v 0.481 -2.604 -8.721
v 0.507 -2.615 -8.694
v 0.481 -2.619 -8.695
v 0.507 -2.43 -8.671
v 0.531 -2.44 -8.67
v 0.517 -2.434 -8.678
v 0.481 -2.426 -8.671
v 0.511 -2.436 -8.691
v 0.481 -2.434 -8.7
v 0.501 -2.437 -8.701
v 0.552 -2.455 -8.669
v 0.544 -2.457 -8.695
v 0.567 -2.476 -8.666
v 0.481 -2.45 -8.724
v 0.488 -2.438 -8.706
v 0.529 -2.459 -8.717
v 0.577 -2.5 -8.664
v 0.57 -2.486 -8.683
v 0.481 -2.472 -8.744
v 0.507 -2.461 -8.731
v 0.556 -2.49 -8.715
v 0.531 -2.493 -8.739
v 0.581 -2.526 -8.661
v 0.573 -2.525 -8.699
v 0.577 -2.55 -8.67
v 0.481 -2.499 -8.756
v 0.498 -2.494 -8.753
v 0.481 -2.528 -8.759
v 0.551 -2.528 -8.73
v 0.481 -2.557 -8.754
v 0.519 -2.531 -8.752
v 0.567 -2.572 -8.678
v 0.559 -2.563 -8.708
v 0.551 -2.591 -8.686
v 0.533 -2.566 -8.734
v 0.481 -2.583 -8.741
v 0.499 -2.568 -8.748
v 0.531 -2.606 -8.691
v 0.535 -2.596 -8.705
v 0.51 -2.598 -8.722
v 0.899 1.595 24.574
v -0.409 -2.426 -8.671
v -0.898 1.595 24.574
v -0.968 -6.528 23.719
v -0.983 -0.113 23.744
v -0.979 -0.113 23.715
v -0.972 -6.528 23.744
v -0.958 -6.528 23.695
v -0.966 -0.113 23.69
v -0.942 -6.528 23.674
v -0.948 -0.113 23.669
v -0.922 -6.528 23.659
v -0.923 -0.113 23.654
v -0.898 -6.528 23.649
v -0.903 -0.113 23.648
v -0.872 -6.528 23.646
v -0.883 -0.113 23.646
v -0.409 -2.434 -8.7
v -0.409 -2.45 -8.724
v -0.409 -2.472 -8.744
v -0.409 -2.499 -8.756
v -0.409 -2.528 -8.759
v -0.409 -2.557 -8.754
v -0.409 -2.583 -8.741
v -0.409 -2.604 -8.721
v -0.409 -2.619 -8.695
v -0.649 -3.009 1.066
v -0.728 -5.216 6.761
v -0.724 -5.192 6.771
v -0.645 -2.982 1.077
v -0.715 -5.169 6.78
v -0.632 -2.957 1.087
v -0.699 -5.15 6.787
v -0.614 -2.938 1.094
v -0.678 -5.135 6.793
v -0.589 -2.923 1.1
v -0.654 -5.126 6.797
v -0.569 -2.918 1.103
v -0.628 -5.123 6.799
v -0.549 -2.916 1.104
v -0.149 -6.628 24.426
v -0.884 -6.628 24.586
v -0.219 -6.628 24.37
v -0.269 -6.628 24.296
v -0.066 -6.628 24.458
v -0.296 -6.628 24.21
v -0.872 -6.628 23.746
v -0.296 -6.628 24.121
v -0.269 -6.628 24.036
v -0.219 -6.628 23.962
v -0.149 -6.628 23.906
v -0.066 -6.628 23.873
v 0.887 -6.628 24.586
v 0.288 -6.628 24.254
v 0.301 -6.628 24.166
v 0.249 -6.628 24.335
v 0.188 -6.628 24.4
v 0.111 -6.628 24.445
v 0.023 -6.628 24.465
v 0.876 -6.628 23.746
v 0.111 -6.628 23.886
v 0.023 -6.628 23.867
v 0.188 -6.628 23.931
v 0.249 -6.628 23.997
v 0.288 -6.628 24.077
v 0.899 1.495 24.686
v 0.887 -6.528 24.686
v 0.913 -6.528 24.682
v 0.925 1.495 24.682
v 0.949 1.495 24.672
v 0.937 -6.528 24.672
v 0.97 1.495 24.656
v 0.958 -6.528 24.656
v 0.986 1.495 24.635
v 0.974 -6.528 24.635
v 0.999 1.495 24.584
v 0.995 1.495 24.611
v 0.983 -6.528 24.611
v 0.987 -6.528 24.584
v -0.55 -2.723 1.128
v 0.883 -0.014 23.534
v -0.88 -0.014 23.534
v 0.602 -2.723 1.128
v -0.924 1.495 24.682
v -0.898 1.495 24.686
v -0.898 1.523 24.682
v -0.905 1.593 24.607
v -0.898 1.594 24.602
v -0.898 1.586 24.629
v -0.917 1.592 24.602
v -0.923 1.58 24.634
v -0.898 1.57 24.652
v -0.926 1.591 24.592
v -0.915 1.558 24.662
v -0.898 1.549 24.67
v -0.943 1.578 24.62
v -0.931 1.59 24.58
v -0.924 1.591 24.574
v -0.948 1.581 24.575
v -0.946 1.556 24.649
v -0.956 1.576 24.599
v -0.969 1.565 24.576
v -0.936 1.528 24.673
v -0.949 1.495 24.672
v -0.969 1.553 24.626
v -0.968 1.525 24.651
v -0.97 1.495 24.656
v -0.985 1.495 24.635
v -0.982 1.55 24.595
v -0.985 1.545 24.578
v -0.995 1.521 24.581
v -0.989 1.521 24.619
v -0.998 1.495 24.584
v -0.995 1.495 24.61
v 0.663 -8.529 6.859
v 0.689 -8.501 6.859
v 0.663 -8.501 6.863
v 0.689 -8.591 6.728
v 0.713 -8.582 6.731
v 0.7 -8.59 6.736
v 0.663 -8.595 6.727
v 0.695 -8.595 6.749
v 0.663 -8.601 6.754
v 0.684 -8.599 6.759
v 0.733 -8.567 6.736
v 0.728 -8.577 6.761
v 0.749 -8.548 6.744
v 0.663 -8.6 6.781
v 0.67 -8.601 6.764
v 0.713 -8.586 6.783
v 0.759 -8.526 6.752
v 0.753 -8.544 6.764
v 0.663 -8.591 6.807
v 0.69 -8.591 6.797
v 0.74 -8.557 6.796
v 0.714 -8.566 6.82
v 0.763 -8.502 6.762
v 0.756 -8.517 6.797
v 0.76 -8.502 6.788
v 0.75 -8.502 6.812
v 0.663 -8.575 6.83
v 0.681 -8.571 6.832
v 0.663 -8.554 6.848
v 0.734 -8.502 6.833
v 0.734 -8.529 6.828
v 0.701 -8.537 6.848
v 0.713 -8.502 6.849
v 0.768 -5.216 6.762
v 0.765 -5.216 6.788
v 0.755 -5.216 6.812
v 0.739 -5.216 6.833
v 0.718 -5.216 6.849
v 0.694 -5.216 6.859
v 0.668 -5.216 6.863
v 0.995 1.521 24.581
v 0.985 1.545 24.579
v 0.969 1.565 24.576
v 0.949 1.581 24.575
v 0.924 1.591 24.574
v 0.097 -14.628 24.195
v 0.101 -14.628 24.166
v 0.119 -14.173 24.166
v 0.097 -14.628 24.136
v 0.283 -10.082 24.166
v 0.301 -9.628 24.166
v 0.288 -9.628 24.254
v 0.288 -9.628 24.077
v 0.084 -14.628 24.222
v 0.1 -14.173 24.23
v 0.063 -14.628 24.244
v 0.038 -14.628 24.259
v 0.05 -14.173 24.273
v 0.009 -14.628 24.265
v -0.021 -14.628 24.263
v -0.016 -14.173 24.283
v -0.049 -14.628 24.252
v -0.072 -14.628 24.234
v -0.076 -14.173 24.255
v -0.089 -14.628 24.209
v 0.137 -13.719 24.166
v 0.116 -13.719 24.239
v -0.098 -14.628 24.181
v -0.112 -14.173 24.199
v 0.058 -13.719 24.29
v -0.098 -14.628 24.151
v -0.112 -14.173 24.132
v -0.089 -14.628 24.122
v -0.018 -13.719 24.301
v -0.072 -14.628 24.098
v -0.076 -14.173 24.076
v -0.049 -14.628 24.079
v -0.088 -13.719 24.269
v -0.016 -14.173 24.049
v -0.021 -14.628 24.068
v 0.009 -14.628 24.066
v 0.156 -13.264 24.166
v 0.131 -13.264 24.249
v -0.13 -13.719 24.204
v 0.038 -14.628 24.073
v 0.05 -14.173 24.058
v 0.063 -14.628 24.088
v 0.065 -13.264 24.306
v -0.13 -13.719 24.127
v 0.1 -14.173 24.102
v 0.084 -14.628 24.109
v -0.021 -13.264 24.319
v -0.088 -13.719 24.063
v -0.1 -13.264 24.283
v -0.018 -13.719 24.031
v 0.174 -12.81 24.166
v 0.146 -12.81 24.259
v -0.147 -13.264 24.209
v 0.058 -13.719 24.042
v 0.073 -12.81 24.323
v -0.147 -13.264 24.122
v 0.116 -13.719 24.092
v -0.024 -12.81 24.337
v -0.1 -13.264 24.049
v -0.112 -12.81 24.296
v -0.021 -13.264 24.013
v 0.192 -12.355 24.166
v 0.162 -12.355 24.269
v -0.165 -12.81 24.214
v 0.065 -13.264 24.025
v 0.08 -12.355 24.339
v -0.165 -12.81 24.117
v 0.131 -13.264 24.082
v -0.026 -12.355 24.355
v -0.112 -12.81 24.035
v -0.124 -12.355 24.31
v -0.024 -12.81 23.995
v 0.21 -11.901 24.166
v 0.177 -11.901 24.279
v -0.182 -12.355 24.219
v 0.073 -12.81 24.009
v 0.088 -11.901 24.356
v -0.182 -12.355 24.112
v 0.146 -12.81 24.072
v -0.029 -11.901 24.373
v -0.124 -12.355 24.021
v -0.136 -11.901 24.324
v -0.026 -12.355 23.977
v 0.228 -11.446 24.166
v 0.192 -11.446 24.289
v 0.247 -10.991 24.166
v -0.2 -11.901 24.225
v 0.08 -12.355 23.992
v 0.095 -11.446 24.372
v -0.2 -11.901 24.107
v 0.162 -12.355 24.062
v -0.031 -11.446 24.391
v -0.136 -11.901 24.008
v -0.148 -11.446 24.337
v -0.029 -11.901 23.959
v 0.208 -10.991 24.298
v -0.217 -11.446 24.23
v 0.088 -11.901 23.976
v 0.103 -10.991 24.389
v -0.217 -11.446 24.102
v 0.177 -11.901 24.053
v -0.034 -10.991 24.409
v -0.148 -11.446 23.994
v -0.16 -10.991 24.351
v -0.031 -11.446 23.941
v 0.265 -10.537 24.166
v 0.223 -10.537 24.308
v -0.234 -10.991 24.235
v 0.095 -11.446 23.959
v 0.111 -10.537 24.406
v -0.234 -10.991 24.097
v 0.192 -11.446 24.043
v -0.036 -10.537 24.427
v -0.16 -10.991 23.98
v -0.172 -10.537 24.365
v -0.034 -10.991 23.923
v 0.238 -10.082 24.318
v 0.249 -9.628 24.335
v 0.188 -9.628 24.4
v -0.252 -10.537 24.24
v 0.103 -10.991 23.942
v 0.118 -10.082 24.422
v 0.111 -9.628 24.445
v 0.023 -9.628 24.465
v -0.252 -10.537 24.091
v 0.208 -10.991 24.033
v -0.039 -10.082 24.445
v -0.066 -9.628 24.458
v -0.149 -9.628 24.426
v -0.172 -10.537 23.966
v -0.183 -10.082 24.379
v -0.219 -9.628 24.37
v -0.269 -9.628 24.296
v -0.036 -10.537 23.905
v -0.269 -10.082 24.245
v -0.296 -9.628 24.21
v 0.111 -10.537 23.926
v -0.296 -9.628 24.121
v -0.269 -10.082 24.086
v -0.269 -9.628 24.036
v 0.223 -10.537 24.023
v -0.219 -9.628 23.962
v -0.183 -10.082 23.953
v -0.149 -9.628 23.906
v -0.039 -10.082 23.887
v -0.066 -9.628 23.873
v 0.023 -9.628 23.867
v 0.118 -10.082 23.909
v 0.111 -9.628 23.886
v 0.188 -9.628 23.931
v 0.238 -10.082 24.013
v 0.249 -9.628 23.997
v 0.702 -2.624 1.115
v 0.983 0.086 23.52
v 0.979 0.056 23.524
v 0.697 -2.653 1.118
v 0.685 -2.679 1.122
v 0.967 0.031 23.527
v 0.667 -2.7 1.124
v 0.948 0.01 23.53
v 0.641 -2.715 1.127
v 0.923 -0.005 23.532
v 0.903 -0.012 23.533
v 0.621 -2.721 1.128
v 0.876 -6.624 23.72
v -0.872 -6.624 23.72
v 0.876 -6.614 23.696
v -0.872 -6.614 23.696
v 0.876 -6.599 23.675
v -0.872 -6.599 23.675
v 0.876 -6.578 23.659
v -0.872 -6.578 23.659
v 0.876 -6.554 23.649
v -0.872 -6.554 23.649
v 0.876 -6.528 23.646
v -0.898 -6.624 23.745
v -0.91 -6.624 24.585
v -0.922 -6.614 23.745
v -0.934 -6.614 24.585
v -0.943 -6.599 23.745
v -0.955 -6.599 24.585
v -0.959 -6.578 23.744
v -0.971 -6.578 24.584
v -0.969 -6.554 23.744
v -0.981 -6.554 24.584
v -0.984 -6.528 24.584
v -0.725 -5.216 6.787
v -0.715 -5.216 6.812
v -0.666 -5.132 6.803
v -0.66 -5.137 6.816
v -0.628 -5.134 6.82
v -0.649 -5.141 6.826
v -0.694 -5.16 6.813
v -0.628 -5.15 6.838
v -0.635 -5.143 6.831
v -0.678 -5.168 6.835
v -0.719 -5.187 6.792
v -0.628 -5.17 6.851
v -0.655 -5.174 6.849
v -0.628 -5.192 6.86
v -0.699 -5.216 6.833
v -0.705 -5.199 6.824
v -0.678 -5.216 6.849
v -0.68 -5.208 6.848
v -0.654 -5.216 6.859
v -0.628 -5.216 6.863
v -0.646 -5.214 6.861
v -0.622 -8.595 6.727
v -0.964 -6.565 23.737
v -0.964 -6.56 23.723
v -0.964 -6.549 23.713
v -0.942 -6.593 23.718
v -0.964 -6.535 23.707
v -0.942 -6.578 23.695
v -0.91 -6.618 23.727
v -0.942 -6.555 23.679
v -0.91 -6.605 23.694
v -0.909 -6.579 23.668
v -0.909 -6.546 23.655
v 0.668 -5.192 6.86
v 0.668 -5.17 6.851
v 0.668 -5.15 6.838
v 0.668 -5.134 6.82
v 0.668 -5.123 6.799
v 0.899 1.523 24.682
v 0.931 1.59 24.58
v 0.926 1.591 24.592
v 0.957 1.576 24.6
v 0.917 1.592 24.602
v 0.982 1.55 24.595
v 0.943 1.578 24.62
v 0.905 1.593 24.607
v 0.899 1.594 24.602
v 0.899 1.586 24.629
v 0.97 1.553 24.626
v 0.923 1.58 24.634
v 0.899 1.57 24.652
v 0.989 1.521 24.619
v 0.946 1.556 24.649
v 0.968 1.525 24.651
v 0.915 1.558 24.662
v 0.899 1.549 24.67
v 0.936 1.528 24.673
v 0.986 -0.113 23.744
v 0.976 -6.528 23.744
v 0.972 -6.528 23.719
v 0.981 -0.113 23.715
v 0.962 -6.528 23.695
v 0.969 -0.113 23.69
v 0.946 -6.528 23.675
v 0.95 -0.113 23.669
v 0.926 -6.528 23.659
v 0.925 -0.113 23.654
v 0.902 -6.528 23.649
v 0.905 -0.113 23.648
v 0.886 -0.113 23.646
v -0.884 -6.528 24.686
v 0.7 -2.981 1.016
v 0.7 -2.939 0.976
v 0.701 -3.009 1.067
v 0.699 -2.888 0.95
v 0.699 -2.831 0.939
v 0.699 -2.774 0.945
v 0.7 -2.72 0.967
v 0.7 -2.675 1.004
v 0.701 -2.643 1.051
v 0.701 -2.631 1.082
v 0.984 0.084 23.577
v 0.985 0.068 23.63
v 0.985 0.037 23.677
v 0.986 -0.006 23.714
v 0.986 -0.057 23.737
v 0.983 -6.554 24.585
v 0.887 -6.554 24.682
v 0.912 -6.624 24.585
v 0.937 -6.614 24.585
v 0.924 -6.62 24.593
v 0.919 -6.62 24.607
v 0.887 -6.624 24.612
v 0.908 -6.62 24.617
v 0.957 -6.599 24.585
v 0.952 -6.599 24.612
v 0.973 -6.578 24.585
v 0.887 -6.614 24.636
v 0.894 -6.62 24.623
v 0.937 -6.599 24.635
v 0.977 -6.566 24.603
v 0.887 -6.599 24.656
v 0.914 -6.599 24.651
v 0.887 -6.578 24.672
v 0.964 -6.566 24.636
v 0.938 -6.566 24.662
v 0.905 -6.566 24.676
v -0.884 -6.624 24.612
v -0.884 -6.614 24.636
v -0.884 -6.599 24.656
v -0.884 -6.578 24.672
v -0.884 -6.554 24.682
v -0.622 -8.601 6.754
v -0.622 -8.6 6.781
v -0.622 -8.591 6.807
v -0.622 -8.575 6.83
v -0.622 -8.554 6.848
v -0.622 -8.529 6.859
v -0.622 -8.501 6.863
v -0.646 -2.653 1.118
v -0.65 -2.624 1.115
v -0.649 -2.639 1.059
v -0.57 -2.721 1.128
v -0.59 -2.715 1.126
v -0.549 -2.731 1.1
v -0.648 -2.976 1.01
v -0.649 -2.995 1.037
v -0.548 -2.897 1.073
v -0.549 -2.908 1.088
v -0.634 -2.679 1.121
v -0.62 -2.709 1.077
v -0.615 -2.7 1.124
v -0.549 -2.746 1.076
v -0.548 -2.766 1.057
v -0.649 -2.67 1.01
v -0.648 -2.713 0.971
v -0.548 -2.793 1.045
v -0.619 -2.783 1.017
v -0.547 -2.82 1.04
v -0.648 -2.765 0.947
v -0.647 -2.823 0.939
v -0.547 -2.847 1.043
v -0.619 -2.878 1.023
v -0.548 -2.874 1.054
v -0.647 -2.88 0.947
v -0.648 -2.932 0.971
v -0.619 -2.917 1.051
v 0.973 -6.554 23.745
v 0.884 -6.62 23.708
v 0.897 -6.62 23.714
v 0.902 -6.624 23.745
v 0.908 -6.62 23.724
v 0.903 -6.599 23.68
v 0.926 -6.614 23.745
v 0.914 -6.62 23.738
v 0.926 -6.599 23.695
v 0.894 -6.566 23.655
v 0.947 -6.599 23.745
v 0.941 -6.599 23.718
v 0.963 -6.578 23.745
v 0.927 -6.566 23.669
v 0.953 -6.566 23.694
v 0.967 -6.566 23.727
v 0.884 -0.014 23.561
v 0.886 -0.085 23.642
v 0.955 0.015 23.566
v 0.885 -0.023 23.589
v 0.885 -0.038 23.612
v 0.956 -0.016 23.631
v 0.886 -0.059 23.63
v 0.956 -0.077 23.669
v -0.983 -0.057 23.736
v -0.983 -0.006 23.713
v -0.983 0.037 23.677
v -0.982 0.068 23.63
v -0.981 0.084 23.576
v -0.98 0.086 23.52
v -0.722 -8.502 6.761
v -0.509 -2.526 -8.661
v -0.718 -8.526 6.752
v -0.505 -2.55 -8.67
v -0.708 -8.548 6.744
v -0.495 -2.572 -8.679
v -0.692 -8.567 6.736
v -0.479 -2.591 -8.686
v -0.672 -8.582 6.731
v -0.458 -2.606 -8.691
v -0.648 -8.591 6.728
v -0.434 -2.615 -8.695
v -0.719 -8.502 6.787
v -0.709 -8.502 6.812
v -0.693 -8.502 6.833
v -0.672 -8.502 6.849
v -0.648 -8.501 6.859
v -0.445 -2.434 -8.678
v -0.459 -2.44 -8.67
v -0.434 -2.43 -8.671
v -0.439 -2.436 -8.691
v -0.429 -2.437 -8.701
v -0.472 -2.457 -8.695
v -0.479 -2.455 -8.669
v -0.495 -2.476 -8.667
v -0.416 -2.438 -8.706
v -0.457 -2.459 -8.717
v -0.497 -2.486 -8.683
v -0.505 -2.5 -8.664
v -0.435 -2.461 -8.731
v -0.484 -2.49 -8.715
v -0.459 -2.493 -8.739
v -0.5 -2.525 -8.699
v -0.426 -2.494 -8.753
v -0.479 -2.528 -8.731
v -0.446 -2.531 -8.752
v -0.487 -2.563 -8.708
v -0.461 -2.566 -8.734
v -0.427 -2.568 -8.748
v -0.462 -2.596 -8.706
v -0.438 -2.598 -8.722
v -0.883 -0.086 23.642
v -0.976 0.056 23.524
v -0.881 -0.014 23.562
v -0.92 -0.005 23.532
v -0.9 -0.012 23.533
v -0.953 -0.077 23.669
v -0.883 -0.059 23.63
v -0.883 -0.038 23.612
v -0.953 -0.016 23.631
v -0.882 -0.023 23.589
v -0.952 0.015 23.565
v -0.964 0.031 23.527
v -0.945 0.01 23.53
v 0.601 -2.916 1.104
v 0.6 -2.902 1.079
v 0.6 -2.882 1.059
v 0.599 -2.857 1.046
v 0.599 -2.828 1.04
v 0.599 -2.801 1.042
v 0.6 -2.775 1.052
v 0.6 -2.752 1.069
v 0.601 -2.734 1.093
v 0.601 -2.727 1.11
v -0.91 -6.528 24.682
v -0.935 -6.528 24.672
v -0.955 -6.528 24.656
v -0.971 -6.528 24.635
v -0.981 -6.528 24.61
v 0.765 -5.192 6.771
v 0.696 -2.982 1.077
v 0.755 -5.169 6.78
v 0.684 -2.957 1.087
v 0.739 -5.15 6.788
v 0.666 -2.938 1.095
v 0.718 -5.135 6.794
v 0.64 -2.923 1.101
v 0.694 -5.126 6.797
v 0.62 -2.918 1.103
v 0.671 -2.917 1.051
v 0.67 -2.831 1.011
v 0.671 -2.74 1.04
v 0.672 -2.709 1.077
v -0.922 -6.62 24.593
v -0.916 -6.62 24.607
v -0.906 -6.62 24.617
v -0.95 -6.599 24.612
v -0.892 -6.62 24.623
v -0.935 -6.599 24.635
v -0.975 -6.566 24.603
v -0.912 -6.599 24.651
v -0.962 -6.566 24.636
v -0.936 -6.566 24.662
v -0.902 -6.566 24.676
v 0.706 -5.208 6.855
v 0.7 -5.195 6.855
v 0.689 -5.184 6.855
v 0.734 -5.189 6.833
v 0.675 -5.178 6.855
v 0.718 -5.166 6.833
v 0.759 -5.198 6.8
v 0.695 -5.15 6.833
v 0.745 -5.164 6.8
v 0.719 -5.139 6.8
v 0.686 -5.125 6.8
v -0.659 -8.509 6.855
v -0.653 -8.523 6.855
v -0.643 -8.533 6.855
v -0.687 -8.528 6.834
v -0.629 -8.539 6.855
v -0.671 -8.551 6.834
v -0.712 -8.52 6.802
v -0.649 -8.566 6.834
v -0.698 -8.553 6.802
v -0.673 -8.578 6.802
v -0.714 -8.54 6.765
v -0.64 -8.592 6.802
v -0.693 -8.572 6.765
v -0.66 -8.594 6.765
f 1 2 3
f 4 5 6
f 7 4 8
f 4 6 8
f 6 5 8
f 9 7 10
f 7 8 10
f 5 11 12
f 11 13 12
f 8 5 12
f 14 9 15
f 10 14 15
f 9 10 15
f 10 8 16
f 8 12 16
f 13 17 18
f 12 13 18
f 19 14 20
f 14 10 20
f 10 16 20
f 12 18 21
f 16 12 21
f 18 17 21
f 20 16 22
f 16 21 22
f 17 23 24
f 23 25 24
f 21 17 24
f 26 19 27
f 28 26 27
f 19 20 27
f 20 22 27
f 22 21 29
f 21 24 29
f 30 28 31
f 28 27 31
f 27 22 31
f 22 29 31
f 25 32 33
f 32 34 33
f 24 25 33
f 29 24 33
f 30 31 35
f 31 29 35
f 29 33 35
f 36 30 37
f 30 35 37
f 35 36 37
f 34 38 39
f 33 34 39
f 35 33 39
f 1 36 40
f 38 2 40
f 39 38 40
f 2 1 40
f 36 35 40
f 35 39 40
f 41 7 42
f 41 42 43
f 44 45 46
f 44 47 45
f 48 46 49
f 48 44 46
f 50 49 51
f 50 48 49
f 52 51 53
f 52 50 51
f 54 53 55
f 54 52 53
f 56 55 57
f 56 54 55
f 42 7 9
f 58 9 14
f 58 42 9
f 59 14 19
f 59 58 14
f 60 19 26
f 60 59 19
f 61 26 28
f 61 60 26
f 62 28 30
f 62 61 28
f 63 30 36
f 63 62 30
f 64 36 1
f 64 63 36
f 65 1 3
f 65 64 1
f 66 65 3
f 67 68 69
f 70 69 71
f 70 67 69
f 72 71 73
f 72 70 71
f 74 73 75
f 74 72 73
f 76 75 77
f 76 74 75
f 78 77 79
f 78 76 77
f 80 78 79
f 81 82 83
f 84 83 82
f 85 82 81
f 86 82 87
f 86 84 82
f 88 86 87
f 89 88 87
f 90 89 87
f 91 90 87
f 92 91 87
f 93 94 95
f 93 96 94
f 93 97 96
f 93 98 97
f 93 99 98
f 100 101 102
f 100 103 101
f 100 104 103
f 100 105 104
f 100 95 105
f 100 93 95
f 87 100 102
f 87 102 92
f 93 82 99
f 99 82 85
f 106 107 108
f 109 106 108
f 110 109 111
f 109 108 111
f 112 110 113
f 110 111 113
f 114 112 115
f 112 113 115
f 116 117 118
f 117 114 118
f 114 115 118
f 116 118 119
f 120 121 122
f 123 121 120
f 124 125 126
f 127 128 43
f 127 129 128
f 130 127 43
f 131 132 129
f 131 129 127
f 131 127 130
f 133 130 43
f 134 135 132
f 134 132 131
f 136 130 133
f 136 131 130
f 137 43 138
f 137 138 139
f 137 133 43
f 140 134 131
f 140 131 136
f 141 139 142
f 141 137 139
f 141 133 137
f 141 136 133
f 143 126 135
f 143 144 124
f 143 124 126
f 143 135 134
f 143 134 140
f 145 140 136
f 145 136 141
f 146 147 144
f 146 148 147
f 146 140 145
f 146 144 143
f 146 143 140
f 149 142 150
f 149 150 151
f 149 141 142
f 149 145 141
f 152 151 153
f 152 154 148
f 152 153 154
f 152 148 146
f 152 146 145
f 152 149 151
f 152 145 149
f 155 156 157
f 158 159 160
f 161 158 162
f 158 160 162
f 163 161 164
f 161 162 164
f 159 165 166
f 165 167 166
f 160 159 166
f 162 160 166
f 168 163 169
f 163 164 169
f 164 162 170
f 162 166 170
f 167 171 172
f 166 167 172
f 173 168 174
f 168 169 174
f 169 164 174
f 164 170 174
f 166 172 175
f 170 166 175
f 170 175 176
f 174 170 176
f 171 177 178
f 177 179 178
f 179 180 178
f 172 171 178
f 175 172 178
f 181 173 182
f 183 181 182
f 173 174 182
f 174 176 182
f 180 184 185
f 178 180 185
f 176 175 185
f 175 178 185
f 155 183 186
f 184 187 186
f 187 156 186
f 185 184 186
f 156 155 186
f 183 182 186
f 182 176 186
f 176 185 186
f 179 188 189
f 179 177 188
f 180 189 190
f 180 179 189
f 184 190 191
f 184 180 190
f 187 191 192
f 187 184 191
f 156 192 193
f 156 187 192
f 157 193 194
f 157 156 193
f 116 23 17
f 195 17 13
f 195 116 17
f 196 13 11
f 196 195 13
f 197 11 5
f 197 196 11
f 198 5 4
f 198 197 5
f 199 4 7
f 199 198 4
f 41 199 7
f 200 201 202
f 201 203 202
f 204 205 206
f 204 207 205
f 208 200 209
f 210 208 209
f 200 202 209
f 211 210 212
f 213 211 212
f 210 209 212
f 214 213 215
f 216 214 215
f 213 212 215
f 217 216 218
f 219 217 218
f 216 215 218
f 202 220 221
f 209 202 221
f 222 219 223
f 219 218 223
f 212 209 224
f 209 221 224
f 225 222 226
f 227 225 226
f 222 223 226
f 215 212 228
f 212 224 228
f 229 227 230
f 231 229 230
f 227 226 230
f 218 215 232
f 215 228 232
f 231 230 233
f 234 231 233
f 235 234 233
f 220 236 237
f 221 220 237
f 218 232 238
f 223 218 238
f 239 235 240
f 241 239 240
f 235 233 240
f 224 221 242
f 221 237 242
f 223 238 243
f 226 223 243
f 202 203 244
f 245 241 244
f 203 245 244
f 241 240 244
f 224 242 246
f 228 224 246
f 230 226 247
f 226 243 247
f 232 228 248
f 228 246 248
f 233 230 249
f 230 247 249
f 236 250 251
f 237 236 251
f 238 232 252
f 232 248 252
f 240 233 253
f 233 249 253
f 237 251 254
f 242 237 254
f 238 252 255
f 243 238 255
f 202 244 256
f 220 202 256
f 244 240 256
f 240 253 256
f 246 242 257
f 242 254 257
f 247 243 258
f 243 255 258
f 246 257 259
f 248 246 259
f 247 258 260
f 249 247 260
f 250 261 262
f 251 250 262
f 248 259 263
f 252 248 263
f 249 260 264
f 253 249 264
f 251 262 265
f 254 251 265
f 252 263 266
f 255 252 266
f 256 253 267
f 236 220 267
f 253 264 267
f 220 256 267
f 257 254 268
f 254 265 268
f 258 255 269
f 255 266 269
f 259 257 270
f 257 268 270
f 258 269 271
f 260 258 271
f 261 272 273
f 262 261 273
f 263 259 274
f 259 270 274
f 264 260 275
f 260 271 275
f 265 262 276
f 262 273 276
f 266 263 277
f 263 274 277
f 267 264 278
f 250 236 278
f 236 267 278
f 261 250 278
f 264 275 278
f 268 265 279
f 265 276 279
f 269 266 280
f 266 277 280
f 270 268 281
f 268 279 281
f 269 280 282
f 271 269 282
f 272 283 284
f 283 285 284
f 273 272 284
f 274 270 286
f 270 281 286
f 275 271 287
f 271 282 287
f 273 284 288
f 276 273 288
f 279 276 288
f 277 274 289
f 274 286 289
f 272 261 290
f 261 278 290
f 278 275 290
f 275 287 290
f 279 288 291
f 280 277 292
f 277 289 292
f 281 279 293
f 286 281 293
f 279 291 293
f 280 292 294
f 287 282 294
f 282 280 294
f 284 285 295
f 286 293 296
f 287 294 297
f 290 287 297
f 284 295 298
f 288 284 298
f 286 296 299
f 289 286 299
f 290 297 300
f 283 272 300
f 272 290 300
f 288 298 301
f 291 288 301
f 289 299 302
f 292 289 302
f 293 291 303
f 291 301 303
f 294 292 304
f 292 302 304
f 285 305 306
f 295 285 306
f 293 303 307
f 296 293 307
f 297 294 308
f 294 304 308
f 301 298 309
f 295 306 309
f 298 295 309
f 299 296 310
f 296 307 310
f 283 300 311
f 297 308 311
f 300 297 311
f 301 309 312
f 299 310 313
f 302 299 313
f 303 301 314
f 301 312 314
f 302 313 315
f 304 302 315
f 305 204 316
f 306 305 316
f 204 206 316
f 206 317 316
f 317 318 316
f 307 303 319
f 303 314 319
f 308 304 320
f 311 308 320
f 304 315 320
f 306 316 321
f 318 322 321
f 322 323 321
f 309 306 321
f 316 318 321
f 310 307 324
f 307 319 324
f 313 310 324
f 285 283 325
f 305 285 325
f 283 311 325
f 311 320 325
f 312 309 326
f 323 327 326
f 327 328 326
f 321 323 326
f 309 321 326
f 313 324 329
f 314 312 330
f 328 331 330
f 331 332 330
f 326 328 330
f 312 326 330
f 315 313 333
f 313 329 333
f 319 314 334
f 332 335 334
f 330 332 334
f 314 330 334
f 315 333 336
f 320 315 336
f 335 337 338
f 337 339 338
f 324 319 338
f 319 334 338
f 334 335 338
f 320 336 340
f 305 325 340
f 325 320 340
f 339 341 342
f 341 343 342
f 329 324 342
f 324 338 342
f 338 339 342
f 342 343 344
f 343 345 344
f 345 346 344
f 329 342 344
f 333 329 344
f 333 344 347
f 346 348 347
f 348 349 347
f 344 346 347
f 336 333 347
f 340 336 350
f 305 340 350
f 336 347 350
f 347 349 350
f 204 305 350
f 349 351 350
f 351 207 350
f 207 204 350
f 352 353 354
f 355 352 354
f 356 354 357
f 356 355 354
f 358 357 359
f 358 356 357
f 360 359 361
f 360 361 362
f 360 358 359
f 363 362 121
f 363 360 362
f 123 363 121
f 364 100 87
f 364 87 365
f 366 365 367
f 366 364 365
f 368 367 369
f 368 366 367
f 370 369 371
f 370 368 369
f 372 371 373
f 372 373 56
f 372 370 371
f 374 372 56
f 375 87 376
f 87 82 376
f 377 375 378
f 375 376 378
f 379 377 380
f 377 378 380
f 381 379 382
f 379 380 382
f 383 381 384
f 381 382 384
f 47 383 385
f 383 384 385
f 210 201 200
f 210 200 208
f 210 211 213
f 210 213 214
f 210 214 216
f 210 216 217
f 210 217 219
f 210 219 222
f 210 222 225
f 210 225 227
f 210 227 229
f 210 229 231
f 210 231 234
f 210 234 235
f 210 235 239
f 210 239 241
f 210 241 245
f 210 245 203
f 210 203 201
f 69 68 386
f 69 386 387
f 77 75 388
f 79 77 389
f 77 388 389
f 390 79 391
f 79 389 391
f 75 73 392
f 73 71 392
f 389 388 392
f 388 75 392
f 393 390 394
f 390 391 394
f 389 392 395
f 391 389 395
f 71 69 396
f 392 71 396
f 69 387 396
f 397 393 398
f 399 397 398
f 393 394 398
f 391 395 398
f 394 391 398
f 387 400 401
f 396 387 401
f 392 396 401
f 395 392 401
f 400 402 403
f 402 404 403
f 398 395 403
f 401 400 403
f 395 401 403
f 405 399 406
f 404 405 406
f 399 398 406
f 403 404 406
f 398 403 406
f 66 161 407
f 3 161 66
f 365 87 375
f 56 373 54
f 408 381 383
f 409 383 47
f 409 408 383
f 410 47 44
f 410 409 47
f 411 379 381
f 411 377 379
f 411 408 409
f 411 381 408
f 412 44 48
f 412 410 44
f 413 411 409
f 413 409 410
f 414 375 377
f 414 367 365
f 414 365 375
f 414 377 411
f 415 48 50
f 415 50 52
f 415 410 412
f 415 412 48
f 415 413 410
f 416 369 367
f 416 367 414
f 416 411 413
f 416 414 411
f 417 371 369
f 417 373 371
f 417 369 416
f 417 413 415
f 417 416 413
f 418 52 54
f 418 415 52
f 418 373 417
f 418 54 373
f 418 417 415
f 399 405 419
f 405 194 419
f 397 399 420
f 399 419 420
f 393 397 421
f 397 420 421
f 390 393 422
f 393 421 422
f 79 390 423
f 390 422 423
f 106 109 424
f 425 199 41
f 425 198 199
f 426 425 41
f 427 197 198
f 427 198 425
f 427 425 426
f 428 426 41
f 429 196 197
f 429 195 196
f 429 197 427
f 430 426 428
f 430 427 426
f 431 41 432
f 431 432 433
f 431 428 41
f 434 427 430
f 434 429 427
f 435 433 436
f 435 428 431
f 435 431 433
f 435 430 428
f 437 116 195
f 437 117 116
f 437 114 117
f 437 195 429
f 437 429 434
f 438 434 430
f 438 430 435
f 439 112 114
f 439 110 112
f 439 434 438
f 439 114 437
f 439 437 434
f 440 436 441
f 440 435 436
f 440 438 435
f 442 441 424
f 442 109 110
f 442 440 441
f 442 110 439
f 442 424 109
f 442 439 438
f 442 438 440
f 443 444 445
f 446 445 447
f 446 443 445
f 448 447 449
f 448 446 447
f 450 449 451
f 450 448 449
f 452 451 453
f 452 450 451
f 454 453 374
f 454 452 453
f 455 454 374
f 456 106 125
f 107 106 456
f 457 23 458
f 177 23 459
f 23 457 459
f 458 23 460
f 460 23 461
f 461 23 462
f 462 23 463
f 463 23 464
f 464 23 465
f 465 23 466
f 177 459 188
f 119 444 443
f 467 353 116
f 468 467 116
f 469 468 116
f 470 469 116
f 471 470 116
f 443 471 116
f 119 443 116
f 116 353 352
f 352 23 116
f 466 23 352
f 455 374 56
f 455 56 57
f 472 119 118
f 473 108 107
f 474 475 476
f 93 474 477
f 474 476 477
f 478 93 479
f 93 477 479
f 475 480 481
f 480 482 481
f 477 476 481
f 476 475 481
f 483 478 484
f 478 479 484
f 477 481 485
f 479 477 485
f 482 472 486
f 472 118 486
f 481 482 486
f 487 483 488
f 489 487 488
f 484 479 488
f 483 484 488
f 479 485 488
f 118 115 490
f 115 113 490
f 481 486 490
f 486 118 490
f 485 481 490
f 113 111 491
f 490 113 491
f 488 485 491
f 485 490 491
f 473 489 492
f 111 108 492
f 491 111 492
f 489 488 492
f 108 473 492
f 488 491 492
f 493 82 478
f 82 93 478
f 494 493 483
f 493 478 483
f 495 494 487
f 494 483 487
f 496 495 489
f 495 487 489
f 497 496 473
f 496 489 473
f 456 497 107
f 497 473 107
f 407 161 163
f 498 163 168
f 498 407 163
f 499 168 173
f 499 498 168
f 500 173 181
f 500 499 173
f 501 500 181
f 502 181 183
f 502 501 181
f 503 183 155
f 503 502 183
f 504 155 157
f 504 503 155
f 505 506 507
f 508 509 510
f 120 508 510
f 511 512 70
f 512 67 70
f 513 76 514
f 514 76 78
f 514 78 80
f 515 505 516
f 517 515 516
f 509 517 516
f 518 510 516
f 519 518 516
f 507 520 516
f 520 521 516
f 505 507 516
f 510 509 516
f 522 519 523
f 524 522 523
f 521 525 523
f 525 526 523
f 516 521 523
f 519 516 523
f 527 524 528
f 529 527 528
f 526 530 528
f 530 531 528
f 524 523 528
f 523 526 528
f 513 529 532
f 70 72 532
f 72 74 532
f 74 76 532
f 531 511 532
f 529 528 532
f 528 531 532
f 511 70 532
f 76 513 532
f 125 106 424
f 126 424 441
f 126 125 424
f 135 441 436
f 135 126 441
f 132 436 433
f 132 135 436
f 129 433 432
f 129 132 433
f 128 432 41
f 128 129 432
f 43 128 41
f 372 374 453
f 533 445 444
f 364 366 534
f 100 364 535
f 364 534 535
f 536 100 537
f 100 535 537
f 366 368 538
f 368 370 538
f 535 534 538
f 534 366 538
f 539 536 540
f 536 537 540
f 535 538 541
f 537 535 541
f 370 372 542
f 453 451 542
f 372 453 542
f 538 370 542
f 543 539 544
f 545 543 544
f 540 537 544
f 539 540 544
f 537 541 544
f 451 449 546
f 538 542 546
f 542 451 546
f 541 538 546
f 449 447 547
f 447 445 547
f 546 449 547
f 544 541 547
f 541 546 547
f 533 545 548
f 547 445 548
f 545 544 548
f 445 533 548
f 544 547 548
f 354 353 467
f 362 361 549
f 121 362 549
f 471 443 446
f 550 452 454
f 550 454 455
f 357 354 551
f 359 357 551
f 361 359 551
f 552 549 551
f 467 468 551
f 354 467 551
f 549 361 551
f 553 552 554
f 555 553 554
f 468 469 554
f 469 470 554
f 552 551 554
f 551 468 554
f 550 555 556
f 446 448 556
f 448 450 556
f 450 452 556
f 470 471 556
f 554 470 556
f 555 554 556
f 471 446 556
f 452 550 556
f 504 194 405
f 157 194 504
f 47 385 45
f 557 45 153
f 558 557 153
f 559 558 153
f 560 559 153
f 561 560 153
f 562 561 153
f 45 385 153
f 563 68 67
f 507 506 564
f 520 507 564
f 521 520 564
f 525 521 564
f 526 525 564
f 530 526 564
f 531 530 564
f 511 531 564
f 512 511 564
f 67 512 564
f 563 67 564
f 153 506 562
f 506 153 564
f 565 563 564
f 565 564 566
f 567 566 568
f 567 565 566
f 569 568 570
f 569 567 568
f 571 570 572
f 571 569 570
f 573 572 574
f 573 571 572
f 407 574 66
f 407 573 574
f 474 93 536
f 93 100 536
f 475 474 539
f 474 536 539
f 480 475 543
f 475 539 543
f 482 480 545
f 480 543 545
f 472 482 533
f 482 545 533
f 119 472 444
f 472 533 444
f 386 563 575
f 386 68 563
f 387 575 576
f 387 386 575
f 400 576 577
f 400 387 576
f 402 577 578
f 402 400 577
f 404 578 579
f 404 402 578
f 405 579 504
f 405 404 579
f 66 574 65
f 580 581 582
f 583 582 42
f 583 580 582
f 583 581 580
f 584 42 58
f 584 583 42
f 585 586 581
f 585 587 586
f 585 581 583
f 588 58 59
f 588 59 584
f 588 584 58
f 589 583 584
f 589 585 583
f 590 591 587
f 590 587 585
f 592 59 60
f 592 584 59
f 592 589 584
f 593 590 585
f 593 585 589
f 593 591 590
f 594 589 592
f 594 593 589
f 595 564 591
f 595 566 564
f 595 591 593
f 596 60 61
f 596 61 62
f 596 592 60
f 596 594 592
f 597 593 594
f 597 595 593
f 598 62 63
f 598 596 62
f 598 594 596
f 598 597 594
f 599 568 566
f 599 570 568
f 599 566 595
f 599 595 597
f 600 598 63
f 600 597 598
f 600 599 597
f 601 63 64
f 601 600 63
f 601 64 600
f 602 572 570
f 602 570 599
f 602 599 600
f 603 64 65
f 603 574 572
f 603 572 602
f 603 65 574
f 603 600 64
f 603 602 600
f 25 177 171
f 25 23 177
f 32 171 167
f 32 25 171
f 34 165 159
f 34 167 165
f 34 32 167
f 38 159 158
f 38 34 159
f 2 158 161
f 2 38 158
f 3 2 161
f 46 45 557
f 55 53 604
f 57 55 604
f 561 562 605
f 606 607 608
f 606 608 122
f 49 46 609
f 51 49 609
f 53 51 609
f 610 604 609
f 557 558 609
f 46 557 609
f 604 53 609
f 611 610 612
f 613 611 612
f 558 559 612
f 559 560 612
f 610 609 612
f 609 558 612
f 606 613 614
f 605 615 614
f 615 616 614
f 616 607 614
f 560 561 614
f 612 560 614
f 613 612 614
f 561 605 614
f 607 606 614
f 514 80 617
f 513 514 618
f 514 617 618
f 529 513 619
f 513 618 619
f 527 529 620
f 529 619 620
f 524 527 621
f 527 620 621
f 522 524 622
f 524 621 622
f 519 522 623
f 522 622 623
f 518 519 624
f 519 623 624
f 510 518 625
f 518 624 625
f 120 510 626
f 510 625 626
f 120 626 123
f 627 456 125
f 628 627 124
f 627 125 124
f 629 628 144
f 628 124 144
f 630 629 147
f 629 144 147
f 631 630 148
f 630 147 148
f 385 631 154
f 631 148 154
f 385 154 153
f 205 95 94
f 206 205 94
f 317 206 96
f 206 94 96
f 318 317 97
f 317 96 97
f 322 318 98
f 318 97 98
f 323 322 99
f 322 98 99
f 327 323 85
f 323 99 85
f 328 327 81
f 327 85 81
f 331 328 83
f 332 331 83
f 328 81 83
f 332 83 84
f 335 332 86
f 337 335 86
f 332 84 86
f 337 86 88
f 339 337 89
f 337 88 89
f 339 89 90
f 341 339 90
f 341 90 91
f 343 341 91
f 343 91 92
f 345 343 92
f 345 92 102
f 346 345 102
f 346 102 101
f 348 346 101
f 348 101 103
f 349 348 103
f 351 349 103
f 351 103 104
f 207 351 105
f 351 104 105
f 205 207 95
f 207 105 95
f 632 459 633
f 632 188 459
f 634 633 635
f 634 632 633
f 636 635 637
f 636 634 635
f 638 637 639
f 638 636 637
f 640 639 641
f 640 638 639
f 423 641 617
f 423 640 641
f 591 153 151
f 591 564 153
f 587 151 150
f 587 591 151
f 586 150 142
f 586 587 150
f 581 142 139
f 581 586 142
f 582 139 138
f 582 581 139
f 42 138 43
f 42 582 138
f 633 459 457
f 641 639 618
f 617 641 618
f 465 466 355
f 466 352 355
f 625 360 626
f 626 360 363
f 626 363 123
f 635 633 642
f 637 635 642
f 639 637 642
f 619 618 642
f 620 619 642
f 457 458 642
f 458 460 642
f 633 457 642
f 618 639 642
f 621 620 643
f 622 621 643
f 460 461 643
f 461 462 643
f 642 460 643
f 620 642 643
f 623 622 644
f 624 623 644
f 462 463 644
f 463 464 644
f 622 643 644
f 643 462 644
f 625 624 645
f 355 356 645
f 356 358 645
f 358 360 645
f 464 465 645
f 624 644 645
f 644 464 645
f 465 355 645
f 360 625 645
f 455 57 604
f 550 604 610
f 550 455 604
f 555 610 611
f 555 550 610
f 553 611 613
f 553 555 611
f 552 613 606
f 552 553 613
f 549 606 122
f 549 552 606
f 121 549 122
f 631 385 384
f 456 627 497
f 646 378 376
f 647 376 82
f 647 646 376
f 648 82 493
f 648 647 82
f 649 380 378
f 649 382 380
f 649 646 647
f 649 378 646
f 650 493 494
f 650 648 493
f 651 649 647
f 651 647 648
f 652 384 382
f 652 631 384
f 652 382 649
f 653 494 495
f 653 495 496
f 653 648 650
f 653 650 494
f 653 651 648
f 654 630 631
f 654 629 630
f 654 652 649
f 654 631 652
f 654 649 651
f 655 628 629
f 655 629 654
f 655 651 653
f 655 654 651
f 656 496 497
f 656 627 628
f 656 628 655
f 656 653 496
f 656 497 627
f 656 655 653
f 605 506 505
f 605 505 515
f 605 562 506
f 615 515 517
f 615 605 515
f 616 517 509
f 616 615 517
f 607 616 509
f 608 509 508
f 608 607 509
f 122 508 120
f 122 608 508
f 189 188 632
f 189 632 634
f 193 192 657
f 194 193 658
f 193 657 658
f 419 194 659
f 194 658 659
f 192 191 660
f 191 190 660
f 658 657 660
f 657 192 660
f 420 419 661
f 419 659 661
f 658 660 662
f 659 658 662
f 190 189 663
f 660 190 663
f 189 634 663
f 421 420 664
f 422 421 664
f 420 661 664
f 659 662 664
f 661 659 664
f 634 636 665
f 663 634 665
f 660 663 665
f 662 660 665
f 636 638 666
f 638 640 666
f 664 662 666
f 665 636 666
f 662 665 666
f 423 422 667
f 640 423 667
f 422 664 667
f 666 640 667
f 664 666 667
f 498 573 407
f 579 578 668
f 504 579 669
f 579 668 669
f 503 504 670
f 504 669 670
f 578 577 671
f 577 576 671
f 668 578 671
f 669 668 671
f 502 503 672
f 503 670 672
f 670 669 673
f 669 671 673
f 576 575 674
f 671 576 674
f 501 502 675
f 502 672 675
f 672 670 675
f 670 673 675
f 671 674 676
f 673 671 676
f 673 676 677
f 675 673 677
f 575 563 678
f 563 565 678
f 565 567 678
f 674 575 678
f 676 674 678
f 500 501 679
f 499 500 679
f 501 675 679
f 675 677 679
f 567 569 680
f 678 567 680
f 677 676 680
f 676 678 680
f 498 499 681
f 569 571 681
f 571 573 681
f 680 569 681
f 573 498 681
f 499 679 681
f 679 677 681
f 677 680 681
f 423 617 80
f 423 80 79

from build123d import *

# Parameters (mm, degrees)
F1_DEPTH = 1
F3_DEPTH = 12.5
F4_R     = 0.3
F5_DEPTH = 8
F6_SIZE2 = 5
F6_SIZE  = 0.2
F7_R     = 0.1


with BuildPart() as f1:
    # F0 (on Right) → F1 (new body, symmetric)
    with BuildSketch(Plane.YZ):
        Polygon((1.6081985701, 24.68570705), (-6.6278126925, 24.68570705), (-6.6278126925, 23.64570705), (0, 23.64570705), (-2.7713922732, 0.7310225915), (-5.147449191, 6.8627829807), (-8.647449191, 6.8627829807), (-2.4741467328, -9.0683216995), align=None)
    extrude(amount=F1_DEPTH, both=True)

    # F2 (on face) → F3 (cut, symmetric)
    with BuildSketch(Plane(origin=(0, -1.3575309583, 0.1641851458), x_dir=(-1, 0, 0), z_dir=(0, 0.9927655515, -0.1200689795))):
        Polygon((-0.5489893374, -11.4567056298), (-1, 24.7002143338), (-8.0727264285, 24.7002143338), (-7.1800793521, -14.4110620022), (7.0385080762, -14.4110620022), (7.0385080762, 24.0597836673), (1, 24.7002143338), (0.4711783549, -11.4567056298), align=None)
    extrude(amount=F3_DEPTH, both=True, mode=Mode.SUBTRACT)

    # F4 (on face) → F5 (join)
    with BuildSketch(Plane.XZ.offset(6.6278126925)):
        with Locations((0.0010640627, 24.16570705)):
            Circle(F4_R)
    extrude(amount=F5_DEPTH)

    # F6
    f6_edges = [f1.edges().sort_by_distance(p)[0] for p in [
        (-0.298936, -14.627813, 24.165707),
    ]]
    f6_side = f1.faces().sort_by_distance((0.001064, -14.627813, 24.165707))[0]
    chamfer(f6_edges, length=F6_SIZE, length2=F6_SIZE2, reference=f6_side)

    # F7
    f7_edges = [f1.edges().sort_by_distance(p)[0] for p in [
        (0.732986, -3.959421, 3.796903),
        (-0.992768, -2.509807, 24.685707),
        (-0.813282, -1.385696, 12.188365),
        (0.766552, -6.897449, 6.862783),
        (0.993832, -2.509807, 24.685707),
        (-0.612964, -5.560798, -1.102769),
        (0.840756, -1.385696, 12.188365),
        (0.979749, -3.313906, 23.645707),
        (0.669912, -5.560798, -1.102769),
        (0.787947, -0.432974, 7.808693),
        (-0.726276, -6.897449, 6.862783),
        (0, 1.608199, 24.685707),
        (-0.298936, -9.627813, 24.165707),
        (-0.751362, -0.432974, 7.808693),
        (-0.686919, -3.959421, 3.796903),
        (0.002175, -6.627813, 23.645707),
        (0.981225, -6.627813, 24.165707),
        (0.001319, 0, 23.645707),
        (0.026155, -2.771392, 0.731023),
        (-0.977986, -6.627813, 24.165707),
        (0.020364, -8.647449, 6.862783),
        (0.036585, -2.474147, -9.068322),
        (0.019912, -5.147449, 6.862783),
        (0.001064, -6.627813, 24.685707),
        (-0.976256, -3.313906, 23.645707),
    ]]
    fillet(f7_edges, radius=F7_R)


solid = f1.part
